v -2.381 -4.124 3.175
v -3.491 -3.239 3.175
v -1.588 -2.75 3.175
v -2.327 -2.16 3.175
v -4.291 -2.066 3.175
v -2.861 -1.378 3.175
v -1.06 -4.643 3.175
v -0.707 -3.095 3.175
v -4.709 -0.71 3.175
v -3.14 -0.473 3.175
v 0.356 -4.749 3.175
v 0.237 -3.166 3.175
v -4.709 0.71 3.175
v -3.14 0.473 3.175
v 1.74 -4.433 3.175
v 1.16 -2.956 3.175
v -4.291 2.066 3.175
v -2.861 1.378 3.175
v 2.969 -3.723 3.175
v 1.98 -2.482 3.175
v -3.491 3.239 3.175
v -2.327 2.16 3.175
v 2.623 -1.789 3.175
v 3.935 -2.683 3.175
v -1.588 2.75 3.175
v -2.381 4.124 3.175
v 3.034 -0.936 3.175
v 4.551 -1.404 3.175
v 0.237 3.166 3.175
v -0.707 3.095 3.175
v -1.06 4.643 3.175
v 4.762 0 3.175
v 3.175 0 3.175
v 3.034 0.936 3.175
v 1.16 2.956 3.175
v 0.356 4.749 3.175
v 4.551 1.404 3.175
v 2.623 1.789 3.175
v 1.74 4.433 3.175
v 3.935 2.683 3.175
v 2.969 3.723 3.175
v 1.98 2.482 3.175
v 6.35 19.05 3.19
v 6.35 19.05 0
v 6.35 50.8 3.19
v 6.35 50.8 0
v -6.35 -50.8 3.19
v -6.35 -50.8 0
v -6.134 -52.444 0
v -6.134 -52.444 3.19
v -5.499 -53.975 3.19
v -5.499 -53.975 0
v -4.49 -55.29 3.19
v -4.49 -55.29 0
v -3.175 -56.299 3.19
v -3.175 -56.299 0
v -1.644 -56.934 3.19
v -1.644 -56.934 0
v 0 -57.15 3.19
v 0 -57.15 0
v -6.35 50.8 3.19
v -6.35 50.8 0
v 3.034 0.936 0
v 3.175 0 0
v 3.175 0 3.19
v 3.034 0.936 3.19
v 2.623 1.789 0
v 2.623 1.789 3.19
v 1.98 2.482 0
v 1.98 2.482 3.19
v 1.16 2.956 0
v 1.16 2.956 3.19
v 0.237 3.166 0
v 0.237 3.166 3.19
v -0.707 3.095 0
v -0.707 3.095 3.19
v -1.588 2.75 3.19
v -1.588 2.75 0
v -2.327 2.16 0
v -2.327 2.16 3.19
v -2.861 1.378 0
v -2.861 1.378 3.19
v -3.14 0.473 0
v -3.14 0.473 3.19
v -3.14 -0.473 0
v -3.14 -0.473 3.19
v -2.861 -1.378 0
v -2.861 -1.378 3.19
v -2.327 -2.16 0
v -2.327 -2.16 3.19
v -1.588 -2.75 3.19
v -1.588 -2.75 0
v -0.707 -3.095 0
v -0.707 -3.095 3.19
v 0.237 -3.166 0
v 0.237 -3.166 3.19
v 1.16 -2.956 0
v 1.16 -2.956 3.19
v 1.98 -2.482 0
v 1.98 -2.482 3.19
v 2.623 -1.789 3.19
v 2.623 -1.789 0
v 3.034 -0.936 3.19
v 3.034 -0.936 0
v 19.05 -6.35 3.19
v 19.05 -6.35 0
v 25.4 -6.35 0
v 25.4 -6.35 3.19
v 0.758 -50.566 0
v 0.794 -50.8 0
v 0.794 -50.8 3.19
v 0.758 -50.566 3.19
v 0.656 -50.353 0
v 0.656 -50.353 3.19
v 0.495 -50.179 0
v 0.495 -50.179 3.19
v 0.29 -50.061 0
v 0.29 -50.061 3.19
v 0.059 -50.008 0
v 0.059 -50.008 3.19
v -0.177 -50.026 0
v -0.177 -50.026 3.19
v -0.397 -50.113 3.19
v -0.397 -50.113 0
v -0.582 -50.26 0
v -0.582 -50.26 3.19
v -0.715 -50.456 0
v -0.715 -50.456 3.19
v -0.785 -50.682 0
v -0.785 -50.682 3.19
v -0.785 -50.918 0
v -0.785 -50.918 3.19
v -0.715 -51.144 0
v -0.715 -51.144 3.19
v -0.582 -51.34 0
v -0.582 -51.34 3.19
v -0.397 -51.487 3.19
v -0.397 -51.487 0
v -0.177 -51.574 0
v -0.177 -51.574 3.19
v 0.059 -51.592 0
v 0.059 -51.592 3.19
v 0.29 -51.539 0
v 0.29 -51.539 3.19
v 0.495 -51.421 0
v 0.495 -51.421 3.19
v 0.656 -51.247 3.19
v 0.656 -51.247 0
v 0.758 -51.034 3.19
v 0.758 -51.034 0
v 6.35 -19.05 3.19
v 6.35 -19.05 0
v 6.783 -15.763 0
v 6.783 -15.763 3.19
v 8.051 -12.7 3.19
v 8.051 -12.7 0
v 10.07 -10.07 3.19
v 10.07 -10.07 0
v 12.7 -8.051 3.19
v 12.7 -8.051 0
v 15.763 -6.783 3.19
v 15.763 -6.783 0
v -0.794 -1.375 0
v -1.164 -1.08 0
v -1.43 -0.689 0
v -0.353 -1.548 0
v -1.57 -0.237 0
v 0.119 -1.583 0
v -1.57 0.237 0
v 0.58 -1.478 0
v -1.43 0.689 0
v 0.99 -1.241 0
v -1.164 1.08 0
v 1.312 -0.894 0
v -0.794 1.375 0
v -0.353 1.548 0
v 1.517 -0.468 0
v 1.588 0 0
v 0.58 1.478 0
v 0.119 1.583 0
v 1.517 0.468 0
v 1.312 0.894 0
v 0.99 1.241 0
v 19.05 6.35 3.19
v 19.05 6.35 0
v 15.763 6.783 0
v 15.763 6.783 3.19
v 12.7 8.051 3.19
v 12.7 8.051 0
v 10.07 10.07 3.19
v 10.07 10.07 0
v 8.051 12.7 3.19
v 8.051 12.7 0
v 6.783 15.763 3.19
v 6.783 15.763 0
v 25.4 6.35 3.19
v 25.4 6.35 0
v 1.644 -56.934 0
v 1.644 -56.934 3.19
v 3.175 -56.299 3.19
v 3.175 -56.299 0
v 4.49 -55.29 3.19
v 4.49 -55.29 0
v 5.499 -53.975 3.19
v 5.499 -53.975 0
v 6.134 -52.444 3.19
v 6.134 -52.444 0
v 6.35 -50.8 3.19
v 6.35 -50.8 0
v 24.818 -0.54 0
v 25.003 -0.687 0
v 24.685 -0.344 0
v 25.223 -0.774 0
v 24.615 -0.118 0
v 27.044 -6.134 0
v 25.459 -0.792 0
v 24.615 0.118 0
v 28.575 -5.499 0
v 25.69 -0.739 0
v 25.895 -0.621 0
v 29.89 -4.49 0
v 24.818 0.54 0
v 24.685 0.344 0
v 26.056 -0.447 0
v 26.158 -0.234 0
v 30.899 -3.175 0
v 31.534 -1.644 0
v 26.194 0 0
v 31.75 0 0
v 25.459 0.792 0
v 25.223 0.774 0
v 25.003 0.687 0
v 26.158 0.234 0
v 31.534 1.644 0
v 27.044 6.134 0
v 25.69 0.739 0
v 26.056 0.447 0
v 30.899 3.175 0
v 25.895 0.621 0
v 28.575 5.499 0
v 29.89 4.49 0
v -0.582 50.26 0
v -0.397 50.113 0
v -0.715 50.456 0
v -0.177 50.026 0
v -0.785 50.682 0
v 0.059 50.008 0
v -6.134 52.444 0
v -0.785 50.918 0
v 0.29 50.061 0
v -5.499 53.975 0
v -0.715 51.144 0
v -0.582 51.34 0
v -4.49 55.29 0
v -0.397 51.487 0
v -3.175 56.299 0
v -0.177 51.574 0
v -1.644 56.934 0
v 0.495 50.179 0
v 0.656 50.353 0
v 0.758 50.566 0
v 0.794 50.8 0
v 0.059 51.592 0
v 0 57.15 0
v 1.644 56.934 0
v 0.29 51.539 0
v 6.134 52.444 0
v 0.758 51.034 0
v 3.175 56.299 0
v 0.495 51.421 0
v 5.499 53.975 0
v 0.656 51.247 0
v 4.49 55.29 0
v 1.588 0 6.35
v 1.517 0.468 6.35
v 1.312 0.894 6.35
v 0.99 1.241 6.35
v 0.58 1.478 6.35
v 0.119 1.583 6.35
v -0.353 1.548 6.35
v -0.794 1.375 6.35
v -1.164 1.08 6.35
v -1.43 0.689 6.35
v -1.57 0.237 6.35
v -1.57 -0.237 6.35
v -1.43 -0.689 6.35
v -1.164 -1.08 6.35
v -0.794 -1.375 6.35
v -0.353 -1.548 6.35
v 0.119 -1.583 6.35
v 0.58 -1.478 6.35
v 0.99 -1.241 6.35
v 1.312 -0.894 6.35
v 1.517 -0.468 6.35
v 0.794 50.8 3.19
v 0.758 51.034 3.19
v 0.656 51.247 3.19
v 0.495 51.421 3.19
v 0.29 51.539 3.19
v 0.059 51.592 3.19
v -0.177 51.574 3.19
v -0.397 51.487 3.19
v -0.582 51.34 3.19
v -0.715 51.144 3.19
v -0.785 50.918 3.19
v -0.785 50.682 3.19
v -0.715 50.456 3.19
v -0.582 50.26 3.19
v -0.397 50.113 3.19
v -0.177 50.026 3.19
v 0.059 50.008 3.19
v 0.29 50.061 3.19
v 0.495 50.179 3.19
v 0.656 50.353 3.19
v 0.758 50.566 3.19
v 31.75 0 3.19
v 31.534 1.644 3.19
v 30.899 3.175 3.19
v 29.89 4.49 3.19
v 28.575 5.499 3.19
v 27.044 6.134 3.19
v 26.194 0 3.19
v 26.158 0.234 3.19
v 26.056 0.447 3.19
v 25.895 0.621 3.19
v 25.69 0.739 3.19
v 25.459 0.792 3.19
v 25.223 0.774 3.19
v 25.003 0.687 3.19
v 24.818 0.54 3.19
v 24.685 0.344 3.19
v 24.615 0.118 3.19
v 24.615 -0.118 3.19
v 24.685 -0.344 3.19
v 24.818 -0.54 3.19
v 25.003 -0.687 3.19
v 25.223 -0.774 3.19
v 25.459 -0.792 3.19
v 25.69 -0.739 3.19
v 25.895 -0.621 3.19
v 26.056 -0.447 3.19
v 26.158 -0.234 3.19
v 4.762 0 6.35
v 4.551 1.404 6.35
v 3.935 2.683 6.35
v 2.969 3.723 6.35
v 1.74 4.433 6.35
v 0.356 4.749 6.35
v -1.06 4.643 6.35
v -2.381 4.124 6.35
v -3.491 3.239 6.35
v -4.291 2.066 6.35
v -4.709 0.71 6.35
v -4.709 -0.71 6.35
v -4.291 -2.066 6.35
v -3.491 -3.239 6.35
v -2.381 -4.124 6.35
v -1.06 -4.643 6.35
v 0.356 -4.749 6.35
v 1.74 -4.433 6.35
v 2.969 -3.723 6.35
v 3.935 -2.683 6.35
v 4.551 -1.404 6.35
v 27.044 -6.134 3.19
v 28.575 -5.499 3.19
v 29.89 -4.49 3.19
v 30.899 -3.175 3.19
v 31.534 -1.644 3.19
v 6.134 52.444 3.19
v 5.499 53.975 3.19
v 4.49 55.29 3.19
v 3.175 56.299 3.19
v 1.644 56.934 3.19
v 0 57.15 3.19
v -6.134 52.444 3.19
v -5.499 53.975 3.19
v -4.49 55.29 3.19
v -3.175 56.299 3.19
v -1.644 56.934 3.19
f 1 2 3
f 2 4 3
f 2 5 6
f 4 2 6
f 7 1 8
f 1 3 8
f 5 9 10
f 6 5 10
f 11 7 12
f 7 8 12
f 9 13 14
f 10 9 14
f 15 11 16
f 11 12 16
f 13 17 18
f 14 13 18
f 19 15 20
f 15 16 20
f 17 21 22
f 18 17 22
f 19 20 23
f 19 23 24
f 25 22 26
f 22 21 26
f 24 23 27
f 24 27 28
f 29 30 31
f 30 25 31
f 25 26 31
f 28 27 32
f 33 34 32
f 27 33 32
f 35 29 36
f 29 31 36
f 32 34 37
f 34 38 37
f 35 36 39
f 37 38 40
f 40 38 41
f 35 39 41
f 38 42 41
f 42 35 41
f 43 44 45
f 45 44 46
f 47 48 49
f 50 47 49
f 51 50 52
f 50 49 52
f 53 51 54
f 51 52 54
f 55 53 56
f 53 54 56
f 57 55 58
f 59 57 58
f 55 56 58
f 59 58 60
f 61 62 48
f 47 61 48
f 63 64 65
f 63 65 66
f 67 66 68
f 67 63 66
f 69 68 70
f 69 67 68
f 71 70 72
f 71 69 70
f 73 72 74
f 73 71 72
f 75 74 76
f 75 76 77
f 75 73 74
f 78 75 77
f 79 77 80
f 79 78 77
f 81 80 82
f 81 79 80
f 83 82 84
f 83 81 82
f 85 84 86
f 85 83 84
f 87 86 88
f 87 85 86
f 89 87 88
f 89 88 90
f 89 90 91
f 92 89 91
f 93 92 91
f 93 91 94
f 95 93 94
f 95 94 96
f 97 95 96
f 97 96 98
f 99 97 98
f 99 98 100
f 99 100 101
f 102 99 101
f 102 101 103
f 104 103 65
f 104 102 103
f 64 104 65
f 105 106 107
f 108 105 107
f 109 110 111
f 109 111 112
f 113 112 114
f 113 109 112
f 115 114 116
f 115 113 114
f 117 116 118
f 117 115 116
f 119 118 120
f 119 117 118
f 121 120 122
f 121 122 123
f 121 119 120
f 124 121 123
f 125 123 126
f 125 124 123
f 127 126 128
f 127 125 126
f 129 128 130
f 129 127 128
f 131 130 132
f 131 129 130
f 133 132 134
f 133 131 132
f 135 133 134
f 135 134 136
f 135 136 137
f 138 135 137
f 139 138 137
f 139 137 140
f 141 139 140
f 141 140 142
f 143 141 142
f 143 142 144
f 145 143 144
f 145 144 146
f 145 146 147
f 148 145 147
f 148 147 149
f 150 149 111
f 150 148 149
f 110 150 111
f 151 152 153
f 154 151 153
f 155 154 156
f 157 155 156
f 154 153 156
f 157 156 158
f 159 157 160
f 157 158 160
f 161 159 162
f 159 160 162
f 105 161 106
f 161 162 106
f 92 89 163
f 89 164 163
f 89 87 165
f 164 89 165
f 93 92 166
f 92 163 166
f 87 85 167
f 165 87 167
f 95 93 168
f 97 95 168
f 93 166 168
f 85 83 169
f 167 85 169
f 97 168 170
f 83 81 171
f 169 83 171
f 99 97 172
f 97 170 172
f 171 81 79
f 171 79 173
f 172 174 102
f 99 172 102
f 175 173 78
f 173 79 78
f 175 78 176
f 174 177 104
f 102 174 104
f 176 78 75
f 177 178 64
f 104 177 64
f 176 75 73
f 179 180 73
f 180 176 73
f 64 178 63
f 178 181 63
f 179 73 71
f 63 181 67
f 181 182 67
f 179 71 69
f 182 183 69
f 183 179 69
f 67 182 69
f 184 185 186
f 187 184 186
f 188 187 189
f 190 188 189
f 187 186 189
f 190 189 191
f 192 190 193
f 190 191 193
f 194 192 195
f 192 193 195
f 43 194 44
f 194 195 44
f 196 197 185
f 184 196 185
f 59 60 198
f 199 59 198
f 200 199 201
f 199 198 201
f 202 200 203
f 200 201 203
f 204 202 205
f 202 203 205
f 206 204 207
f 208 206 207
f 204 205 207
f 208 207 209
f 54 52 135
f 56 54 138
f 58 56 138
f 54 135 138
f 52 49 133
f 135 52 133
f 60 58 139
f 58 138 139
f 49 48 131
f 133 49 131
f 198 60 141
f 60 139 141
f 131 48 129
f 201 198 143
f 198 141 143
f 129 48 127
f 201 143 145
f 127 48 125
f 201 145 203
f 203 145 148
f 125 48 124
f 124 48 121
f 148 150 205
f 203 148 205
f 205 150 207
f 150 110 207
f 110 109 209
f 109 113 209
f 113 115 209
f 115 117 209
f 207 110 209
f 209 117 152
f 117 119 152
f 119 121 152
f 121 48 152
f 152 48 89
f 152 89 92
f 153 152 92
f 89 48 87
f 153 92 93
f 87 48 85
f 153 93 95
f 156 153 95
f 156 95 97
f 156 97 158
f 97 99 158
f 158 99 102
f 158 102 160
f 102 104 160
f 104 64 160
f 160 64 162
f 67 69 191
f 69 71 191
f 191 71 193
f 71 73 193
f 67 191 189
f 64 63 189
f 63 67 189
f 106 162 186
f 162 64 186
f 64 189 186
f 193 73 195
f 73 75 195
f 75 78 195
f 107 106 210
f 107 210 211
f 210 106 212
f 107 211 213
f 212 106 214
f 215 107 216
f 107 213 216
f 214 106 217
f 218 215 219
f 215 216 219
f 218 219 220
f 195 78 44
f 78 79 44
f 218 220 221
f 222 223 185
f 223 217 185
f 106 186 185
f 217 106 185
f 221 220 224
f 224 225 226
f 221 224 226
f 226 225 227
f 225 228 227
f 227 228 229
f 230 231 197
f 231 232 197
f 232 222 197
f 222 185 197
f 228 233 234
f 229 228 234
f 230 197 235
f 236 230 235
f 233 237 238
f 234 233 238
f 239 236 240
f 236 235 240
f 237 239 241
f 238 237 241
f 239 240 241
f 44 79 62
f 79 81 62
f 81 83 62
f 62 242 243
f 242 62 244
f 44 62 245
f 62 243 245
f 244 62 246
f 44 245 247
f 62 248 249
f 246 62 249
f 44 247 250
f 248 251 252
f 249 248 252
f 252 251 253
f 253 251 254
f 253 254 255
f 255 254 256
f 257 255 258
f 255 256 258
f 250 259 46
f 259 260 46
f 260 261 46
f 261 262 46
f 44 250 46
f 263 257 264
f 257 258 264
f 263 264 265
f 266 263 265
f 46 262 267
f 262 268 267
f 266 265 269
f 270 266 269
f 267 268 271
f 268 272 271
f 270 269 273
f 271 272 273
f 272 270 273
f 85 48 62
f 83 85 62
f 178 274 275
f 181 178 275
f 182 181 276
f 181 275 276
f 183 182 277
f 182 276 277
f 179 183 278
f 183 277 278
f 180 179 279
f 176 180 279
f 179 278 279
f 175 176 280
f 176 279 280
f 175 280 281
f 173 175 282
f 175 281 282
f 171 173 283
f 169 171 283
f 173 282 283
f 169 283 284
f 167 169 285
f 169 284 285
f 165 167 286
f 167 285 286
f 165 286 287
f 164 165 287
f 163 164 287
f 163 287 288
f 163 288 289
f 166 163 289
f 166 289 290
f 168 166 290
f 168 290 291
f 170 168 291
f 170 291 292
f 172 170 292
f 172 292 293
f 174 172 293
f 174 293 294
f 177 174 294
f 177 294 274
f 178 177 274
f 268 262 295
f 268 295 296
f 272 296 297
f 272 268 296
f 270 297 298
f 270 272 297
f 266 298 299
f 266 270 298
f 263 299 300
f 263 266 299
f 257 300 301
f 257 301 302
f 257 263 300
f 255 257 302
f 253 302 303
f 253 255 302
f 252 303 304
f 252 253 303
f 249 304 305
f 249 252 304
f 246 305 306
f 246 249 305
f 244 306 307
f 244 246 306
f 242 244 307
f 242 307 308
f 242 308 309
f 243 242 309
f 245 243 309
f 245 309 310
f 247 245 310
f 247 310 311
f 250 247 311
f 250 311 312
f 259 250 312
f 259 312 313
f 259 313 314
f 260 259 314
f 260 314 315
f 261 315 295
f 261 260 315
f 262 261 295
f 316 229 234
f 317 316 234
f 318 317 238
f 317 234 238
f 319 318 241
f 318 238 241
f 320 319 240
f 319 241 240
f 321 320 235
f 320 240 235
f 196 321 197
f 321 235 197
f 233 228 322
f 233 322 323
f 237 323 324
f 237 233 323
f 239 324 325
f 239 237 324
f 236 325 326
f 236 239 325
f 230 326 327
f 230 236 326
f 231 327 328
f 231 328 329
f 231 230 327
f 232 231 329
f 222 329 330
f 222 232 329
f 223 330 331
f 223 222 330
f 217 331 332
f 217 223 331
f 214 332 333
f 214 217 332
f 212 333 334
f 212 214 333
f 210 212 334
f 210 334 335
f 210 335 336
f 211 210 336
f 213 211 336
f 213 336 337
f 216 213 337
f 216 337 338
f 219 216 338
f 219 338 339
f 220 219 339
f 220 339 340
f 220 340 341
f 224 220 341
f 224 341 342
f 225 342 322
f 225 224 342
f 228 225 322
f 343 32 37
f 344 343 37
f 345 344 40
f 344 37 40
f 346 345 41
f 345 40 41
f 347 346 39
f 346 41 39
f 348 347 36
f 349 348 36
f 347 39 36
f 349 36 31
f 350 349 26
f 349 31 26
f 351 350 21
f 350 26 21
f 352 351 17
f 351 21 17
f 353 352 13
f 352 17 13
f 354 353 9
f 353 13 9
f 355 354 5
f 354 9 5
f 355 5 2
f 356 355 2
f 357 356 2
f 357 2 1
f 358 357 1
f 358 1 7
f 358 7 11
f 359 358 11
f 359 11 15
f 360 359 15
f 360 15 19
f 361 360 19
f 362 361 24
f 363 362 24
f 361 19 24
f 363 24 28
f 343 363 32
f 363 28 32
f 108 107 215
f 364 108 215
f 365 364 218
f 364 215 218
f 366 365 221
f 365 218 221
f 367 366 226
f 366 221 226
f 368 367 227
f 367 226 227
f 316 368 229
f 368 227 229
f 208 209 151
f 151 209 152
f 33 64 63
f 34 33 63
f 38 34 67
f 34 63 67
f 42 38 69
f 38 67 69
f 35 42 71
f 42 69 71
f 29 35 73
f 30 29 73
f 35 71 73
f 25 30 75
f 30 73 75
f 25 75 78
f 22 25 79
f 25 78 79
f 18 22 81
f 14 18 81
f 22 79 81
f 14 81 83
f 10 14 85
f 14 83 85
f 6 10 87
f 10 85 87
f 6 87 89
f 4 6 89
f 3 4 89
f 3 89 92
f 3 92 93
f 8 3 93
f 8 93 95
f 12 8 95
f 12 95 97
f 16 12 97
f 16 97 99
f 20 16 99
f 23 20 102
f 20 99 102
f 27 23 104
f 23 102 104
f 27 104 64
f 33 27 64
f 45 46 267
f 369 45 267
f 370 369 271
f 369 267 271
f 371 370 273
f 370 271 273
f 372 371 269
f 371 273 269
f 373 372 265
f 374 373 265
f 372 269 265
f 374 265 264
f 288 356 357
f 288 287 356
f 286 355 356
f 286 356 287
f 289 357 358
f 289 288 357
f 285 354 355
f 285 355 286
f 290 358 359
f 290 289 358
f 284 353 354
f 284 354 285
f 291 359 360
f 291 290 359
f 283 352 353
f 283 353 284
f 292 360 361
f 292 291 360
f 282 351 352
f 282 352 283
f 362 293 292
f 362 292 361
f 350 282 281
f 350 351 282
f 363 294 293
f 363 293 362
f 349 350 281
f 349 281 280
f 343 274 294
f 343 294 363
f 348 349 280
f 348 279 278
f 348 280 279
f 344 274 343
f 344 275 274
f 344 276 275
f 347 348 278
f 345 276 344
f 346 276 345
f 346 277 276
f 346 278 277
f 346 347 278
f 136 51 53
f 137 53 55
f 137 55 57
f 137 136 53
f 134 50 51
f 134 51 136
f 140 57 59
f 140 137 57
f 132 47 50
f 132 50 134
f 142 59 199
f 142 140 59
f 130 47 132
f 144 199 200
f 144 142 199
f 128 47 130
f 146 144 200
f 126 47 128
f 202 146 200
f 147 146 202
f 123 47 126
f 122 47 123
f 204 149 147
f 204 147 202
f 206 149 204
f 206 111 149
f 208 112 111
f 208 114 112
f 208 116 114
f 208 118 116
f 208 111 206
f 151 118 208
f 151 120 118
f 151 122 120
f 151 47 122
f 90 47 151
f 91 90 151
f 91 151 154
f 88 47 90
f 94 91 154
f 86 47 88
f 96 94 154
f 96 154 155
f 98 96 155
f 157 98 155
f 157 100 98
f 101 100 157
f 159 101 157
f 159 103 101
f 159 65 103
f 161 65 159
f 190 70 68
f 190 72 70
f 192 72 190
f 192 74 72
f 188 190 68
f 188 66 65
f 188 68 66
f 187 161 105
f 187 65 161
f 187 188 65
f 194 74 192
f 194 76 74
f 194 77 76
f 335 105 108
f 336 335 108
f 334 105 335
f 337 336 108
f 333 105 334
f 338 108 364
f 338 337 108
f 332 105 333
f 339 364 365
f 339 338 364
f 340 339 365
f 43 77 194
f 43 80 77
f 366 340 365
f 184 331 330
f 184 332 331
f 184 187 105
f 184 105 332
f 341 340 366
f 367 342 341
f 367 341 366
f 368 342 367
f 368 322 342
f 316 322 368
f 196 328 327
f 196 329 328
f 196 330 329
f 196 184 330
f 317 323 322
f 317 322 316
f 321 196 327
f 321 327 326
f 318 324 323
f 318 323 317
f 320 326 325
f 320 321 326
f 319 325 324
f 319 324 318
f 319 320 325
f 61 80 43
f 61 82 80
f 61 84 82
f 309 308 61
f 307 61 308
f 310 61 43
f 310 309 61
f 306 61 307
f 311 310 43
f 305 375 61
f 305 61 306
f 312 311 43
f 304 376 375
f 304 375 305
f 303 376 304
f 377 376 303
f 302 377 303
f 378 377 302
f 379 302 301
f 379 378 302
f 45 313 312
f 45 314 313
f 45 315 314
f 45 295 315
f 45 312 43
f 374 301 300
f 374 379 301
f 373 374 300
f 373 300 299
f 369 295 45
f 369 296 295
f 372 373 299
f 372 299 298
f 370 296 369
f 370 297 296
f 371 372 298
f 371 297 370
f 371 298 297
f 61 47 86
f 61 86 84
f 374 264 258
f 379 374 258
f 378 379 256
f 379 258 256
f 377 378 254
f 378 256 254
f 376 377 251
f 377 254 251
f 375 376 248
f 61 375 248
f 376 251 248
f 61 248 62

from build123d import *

# Parameters (mm, degrees)
F0_R     = 3.175
F1_DEPTH = 3.175
F2_R     = 4.7625
F3_DEPTH = 3.175
F4_R     = 1.5875
F5_DEPTH = 6.351
F6_R     = 0.79375
F6_R_2   = 3.175
F7_DEPTH = 3.19024


with BuildPart() as f1:
    # F0 (on Top) → F1 (new body)
    with BuildSketch(Plane.XY):
        Circle(F0_R)
    extrude(amount=F1_DEPTH)

    # F2 (on face) → F3 (join)
    with BuildSketch(Plane.XY.offset(3.175)):
        Circle(F2_R)
    extrude(amount=F3_DEPTH)

    # F4 (on face) → F5 (cut, through all)
    with BuildSketch(Plane.XY.offset(6.35)):
        Circle(F4_R)
    extrude(amount=-F5_DEPTH, mode=Mode.SUBTRACT)


with BuildPart() as f7:
    # F6 (on Top) → F7 (new body)
    with BuildSketch(Plane.XY):
        with BuildLine():
            Line((6.35, 19.05), (6.35, 50.8))
            ThreePointArc((6.35, 50.8), (4.490128, 55.290128), (0, 57.15))
            ThreePointArc((0, 57.15), (-4.490128, 55.290128), (-6.35, 50.8))
            Line((-6.35, 50.8), (-6.35, -50.8))
            ThreePointArc((-6.35, -50.8), (-4.490128, -55.290128), (0, -57.15))
            ThreePointArc((0, -57.15), (4.490128, -55.290128), (6.35, -50.8))
            Line((6.35, -50.8), (6.35, -19.05))
            ThreePointArc((6.35, -19.05), (10.069744, -10.069744), (19.05, -6.35))
            Line((19.05, -6.35), (25.4, -6.35))
            ThreePointArc((25.4, -6.35), (29.890128, -4.490128), (31.75, 0))
            ThreePointArc((31.75, 0), (29.890128, 4.490128), (25.4, 6.35))
            Line((25.4, 6.35), (19.05, 6.35))
            ThreePointArc((19.05, 6.35), (10.069744, 10.069744), (6.35, 19.05))
        make_face()
        with Locations((0, -50.8)):
            Circle(F6_R, mode=Mode.SUBTRACT)
        Circle(F6_R_2, mode=Mode.SUBTRACT)
        with Locations((0, 50.8)):
            Circle(F6_R, mode=Mode.SUBTRACT)
        with Locations((25.4, 0)):
            Circle(F6_R, mode=Mode.SUBTRACT)
    extrude(amount=F7_DEPTH)


solid = Compound([f1.part, f7.part])
